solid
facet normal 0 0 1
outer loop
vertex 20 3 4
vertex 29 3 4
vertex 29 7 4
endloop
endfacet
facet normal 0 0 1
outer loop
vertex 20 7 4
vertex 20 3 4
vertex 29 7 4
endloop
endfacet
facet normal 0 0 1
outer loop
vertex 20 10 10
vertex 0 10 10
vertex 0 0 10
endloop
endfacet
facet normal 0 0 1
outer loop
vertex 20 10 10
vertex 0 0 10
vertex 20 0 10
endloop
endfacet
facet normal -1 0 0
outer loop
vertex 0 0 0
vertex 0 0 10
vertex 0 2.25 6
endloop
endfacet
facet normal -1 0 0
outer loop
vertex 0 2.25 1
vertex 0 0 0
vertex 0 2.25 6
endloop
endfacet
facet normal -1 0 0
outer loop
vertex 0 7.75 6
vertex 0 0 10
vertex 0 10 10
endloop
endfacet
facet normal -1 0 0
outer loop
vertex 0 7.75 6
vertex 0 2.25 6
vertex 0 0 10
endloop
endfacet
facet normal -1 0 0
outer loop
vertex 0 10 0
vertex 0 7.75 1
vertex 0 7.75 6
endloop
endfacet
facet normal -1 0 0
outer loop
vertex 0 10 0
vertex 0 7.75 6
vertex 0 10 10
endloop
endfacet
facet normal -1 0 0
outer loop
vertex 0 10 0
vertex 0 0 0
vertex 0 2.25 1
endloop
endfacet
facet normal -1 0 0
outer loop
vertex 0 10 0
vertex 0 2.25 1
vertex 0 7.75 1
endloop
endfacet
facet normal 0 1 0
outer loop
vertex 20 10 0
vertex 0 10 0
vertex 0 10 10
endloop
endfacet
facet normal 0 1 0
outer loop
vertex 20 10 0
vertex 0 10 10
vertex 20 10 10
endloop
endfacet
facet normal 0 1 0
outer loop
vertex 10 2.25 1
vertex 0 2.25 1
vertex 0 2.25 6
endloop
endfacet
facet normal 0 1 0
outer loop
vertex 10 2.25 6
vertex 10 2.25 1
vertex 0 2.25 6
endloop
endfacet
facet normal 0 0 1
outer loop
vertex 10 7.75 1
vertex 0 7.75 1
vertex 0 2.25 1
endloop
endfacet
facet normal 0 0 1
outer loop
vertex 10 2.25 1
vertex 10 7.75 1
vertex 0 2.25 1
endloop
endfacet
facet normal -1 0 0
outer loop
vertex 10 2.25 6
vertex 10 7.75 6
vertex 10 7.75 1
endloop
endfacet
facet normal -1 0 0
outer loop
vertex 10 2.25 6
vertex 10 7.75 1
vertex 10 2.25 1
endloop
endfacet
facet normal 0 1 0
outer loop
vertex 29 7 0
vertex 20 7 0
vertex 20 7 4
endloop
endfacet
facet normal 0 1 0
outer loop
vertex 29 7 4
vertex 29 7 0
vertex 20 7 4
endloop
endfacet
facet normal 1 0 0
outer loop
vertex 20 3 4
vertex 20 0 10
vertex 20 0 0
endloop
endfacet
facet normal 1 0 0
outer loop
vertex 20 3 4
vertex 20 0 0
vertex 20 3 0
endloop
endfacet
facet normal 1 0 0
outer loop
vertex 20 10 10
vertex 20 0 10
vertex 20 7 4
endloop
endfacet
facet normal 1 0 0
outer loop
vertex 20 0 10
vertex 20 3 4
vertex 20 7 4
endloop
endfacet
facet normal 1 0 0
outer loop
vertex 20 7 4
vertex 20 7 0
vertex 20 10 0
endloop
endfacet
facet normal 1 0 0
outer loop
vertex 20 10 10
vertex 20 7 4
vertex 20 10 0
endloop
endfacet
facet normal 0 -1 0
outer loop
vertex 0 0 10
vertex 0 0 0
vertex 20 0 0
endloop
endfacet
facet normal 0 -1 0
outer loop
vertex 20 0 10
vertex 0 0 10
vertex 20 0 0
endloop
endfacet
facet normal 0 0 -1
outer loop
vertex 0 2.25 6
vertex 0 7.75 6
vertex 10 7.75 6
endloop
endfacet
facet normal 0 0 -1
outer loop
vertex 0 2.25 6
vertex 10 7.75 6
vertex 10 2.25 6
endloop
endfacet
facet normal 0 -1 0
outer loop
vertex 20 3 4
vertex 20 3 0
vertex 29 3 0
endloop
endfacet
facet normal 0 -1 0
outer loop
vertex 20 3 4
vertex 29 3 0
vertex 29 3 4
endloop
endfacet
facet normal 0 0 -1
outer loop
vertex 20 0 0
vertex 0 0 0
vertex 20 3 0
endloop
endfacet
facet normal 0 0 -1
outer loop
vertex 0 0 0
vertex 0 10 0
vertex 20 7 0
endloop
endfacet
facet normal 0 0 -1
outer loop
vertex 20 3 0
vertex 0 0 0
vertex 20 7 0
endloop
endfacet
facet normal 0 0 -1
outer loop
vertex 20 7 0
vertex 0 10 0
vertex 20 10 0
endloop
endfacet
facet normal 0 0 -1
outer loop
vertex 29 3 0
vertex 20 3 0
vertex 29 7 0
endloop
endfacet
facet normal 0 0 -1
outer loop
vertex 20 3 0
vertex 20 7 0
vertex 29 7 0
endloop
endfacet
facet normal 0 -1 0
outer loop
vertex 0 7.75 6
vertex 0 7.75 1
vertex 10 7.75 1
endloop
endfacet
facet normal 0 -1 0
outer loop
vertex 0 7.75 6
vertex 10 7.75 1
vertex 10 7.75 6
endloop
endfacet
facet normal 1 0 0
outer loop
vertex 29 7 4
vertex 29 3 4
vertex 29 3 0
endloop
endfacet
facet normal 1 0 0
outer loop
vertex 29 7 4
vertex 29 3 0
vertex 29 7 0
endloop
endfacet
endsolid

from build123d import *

# Parameters (mm, degrees)
F0_W     = 20
F0_H     = 10
F1_DEPTH = 10
F2_W     = 4
F2_H     = 4
F3_DEPTH = 9
F4_W     = 5.5
F4_H     = 5
F5_DEPTH = 10


with BuildPart() as f1:
    # F0 (on Top) → F1 (new body)
    with BuildSketch(Plane.XY):
        with Locations((10, 5)):
            Rectangle(F0_W, F0_H)
    extrude(amount=F1_DEPTH)

    # F2 (on face) → F3 (join)
    with BuildSketch(Plane.YZ.offset(20)):
        with Locations((5, 2)):
            Rectangle(F2_W, F2_H)
    extrude(amount=F3_DEPTH)

    # F4 (on face) → F5 (cut)
    with BuildSketch(Plane(origin=(0, 0, 0), x_dir=(0, -1, 0), z_dir=(-1, 0, 0))):
        with Locations((-5, 3.5)):
            Rectangle(F4_W, F4_H)
    extrude(amount=-F5_DEPTH, mode=Mode.SUBTRACT)


solid = f1.part
